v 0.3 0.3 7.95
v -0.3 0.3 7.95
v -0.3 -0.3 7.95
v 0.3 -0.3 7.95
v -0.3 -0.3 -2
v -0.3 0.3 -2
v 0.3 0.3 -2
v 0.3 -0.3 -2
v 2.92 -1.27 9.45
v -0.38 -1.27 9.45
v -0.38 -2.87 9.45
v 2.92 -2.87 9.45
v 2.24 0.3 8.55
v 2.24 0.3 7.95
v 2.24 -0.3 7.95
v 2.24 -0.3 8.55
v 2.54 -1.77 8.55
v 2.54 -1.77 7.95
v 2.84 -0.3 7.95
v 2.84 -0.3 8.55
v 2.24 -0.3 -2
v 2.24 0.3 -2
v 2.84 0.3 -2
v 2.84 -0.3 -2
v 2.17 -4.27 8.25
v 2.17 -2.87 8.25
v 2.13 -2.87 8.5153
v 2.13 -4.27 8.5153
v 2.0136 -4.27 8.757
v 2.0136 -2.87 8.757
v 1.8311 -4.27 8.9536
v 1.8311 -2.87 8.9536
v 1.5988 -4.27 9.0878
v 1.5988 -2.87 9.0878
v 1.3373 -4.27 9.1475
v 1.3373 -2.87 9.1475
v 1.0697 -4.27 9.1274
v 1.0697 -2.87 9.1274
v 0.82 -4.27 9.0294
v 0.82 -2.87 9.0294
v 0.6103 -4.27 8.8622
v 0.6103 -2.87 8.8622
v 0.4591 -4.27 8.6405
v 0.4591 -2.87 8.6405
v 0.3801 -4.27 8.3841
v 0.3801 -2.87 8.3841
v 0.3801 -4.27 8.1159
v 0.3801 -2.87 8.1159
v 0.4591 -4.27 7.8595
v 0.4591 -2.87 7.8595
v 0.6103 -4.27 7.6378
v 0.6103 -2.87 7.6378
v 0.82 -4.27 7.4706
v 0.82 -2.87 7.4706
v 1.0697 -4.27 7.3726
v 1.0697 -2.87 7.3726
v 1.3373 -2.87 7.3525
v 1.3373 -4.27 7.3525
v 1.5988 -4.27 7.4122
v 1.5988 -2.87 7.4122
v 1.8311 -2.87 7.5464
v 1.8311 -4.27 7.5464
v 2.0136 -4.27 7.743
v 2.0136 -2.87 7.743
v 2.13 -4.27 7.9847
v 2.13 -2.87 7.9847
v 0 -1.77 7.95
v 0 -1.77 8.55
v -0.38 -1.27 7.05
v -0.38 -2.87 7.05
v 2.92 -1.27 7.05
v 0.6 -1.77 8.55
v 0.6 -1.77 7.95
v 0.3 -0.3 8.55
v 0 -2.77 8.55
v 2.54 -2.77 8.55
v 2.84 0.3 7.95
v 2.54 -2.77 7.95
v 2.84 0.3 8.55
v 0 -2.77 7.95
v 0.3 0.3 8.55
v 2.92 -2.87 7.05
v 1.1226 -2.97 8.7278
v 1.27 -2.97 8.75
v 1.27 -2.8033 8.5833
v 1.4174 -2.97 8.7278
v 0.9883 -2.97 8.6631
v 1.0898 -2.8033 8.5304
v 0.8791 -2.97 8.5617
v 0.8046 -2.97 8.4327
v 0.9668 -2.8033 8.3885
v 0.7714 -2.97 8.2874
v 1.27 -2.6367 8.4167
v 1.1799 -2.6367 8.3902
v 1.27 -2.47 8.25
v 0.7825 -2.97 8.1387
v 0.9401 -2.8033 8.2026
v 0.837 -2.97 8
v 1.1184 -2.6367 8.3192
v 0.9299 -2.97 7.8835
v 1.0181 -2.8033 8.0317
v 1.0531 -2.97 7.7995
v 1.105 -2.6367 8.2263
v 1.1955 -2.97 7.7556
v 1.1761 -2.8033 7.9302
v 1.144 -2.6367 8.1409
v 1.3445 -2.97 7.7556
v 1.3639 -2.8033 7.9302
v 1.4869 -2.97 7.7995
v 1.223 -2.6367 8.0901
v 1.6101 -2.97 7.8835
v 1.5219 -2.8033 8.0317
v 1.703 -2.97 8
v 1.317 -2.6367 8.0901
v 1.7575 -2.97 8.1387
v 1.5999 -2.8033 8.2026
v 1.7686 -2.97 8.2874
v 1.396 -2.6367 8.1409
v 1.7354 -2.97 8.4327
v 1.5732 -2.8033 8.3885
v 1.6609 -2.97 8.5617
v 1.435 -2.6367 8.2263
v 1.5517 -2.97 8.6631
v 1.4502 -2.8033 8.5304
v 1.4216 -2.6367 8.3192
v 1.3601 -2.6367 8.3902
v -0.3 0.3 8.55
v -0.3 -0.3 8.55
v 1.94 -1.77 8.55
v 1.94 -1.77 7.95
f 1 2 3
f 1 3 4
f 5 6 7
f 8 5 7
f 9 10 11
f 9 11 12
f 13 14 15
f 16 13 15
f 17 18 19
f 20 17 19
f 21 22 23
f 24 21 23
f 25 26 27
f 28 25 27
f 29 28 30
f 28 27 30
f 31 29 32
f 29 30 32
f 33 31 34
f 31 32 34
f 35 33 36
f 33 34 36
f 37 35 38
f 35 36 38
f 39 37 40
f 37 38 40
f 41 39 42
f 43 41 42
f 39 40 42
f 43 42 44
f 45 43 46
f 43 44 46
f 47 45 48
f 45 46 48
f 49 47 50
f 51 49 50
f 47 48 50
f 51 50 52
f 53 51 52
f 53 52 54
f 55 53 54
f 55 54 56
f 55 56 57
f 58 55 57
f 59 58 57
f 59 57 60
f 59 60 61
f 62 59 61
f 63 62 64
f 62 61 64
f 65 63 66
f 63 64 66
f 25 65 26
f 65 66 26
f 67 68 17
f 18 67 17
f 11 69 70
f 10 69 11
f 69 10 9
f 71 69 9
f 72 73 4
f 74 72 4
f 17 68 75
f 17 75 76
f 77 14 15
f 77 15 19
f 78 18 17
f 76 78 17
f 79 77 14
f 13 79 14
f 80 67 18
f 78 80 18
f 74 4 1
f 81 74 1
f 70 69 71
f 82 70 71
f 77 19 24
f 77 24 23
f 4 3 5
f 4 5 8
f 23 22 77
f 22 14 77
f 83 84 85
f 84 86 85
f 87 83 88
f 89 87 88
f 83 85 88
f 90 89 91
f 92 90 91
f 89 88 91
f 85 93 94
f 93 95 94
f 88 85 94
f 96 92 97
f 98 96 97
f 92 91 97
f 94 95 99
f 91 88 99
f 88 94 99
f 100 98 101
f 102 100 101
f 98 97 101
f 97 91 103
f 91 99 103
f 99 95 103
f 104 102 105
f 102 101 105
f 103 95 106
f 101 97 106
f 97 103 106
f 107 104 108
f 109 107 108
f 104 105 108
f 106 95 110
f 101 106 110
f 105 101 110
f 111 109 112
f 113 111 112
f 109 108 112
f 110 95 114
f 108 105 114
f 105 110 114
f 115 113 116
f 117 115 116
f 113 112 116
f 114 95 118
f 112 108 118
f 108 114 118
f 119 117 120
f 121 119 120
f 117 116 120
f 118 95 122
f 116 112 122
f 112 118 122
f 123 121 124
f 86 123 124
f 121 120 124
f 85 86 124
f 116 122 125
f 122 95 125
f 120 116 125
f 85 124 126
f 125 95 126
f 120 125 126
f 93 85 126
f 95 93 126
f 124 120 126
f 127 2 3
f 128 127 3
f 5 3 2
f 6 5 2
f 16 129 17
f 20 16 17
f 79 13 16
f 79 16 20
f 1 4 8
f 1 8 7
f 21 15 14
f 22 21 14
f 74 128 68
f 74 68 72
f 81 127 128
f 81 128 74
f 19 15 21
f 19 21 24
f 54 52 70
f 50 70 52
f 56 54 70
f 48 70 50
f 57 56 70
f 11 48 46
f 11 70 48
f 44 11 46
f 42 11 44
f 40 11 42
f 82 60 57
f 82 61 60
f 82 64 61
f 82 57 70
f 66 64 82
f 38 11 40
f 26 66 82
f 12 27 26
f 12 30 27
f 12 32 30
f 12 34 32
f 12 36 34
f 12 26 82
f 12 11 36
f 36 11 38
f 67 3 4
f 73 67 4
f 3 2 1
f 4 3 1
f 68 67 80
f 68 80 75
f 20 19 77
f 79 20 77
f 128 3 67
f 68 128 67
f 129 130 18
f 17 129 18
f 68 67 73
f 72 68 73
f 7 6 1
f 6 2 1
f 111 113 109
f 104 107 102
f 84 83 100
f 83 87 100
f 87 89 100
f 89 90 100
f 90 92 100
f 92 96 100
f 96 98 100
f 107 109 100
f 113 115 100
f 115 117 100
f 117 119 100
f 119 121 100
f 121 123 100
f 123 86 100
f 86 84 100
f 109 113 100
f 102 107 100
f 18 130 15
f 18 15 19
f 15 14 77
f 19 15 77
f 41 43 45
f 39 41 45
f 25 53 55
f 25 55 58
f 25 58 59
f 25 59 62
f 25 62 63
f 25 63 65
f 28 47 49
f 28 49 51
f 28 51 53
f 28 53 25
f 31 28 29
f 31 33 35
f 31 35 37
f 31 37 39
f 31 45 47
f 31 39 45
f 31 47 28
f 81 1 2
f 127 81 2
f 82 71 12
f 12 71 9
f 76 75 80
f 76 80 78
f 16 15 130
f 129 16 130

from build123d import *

# Parameters (mm, degrees)
SKETCH_W       = 0.6
SKETCH_H       = 0.6
PAD_DEPTH      = 7.95
PAD_DEPTH_BACK = 2
PAD001_DEPTH   = 0.6
SKETCH002_W    = 2.54
SKETCH002_H    = 0.6
PAD002_DEPTH   = 1
SKETCH004_W    = 3.3
SKETCH004_H    = 2.4
PAD003_DEPTH   = 1.6
SKETCH006_R    = 0.9
PAD004_DEPTH   = 1.4


with BuildPart() as pad:
    # Sketch → Pad (new body, two sides)
    with BuildSketch(Plane.XY) as pad_sk:
        Rectangle(SKETCH_W, SKETCH_H)
        with Locations((2.54, 0)):
            Rectangle(SKETCH_W, SKETCH_H)
    extrude(amount=PAD_DEPTH)
    extrude(pad_sk.sketch, amount=-PAD_DEPTH_BACK)


with BuildPart() as pad001:
    # Sketch001 → Pad001 (new body)
    with BuildSketch(Plane.XY.offset(7.95)):
        Polygon((0.3, 0.3), (-0.3, 0.3), (-0.3, -0.3), (0, -1.77), (0.6, -1.77), (0.3, -0.3), align=None)
        Polygon((2.84, 0.3), (2.24, 0.3), (2.24, -0.3), (1.94, -1.77), (2.54, -1.77), (2.84, -0.3), align=None)
    extrude(amount=PAD001_DEPTH)


with BuildPart() as pad002:
    # Sketch002 → Pad002 (new body)
    with BuildSketch(Plane.XZ.offset(1.77)):
        with Locations((1.27, 8.25)):
            Rectangle(SKETCH002_W, SKETCH002_H)
    extrude(amount=PAD002_DEPTH)


with BuildPart() as revolution001:
    # Sketch005 → Revolution001 (revolve)
    with BuildSketch(Plane.YZ.offset(1.27)):
        Polygon((-2.47, 8.25), (-2.97, 8.25), (-2.97, 8.75), align=None)
    revolve(axis=Axis((1.27, -3.977201, 8.25), (0, -1, 0)))


with BuildPart() as pad004:
    # Sketch004 → Pad003 (new body)
    with BuildSketch(Plane.XZ.offset(1.27)):
        with Locations((1.27, 8.25)):
            Rectangle(SKETCH004_W, SKETCH004_H)
    extrude(amount=PAD003_DEPTH)

    # Sketch006 → Pad004 (new body)
    with BuildSketch(Plane.XZ.offset(2.87)):
        with Locations((1.27, 8.25)):
            Circle(SKETCH006_R)
    extrude(amount=PAD004_DEPTH)


solid = Compound([pad.part, pad001.part, pad002.part, revolution001.part, pad004.part])
